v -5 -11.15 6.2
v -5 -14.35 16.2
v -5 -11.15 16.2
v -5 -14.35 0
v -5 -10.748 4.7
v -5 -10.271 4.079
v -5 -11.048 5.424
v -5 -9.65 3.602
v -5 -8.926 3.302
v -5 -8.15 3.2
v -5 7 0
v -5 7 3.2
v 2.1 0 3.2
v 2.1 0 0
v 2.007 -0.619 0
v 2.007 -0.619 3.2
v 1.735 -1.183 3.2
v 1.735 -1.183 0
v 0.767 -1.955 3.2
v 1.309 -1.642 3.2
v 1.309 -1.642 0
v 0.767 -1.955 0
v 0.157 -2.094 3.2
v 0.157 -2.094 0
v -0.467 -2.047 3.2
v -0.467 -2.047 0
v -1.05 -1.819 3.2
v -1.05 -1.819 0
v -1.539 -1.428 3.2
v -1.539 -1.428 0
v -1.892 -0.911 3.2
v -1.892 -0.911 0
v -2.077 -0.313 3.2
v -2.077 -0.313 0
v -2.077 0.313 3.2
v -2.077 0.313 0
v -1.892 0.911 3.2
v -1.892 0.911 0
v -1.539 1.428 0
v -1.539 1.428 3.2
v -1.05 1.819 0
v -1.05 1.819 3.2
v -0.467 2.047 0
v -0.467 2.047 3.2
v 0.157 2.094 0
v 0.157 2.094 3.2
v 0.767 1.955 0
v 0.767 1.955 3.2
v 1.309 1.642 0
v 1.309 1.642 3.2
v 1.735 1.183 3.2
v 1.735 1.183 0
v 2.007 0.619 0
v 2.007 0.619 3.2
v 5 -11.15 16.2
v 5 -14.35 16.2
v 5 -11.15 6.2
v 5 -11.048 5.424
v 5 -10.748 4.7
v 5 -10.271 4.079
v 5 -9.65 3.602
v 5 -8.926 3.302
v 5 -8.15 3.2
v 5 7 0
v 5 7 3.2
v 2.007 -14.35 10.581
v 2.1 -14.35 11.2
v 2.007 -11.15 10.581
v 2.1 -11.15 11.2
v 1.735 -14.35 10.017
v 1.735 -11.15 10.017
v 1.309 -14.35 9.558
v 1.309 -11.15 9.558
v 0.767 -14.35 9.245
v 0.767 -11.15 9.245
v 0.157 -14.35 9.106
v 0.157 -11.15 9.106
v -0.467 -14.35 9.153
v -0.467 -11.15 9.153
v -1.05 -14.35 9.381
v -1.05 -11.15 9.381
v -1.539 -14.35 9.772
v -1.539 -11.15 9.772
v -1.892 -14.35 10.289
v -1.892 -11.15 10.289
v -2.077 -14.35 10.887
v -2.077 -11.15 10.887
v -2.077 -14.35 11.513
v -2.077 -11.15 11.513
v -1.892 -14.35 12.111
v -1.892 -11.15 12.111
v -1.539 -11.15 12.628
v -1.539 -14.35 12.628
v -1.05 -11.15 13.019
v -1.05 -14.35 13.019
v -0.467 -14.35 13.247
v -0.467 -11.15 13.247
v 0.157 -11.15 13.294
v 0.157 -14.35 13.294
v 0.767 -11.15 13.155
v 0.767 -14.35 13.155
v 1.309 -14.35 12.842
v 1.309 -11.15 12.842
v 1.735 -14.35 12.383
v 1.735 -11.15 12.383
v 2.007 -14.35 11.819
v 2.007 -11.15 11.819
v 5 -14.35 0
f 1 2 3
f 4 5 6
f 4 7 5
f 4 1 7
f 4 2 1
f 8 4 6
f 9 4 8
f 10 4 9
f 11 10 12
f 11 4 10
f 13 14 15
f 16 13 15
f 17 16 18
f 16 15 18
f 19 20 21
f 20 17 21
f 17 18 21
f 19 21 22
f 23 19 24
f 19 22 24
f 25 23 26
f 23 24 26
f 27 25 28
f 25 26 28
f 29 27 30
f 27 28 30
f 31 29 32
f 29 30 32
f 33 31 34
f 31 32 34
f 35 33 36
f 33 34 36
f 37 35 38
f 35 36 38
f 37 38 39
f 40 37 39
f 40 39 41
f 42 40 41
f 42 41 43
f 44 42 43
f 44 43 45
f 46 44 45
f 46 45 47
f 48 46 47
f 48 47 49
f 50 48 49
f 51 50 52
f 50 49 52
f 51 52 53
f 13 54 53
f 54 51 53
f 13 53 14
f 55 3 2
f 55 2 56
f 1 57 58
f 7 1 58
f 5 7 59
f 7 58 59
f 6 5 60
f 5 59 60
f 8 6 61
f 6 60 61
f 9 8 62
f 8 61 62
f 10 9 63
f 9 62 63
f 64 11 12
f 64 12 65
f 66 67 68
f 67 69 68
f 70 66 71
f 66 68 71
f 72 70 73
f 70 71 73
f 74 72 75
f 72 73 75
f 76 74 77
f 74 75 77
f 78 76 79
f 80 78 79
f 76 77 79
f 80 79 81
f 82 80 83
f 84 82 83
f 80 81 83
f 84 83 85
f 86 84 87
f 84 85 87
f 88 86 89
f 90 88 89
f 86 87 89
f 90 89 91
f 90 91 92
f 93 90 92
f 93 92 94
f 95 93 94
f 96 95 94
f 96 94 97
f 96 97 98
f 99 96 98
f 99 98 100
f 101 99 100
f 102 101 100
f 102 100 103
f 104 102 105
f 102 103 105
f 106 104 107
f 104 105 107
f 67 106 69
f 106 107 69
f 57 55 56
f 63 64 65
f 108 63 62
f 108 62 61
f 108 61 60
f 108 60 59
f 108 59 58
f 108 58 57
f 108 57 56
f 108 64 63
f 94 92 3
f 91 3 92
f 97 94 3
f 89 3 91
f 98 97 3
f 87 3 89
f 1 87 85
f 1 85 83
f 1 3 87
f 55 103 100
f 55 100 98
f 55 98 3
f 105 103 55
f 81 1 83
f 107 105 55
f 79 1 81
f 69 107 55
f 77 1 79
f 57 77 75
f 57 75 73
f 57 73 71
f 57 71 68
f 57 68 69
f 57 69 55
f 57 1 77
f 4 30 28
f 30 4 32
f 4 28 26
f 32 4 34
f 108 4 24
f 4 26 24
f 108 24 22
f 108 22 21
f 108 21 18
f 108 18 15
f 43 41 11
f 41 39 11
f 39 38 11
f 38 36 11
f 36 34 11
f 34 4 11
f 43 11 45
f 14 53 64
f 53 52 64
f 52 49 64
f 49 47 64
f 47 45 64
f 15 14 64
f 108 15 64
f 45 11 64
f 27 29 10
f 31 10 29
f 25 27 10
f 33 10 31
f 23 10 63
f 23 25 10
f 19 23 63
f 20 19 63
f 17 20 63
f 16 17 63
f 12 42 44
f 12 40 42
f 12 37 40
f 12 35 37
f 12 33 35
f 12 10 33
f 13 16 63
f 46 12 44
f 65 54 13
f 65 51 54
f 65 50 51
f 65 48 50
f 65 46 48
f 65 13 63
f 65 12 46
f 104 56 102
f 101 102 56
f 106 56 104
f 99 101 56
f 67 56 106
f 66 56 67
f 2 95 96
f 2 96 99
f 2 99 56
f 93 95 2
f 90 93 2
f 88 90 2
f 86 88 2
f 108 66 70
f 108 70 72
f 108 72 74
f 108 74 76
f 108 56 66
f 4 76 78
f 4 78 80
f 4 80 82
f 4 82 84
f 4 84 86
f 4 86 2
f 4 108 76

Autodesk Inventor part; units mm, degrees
ref_plane "YZ Plane" through (0, 0, 0) normal (1, 0, 0) x (0, 1, 0)
ref_plane "XZ Plane" through (0, 0, 0) normal (0, 1, 0) x (-1, 0, 0)
ref_plane "XY Plane" through (0, 0, 0) normal (0, 0, 1) x (1, 0, 0)
sketch "Эскиз1" plane through (0, 0, 0) normal (0, 0, 1) x (1, 0, 0)
  circle A0 centre (0, 0) radius 2.1
  line L0 (-5, 14.35) -> (5, 14.35)
  line L1 (5, 14.35) -> (5, -14.35)
  line L2 (5, -14.35) -> (-5, -14.35)
  line L3 (-5, -14.35) -> (-5, 14.35)
  line L4 (-5, 14.35) -> (5, -14.35) construction
  line L5 (5, 14.35) -> (-5, -14.35) construction
  line L6 (-5, 7) -> (5, 7)
  dimension "d0" = 4.2
  dimension "d2" = 10
  dimension "d3" = 28.7
  dimension "d4" = 7
extrude "Выдавливание1" add sketch "Эскиз1" along normal blind 3.2 contours L6 L1 L2 L3
sketch "Эскиз2" plane through (0, 0, 3.2) normal (0, 0, 1) x (1, 0, 0)
  line L0 (5, -14.35) -> (5, 7) projected
  line L1 (5, -14.35) -> (-5, -14.35)
  line L2 (-5, -14.35) -> (-5, -11.15)
  line L3 (-5, -11.15) -> (5, -11.15)
  line L4 (5, -11.15) -> (5, -14.35)
  point P0 (0, 0)
  point P1 (5, -11.15)
  dimension "d7" = 10
  dimension "d8" = 3.2
extrude "Выдавливание2" add sketch "Эскиз2" along normal blind 13
fillet "Сопряжение1" radius 3 1 edges at (0, -11.15, 3.2)
sketch "Эскиз3" plane through (-5, -11.15, 16.2) normal (0, 1, 0) x (1, 0, 0)
  line L0 (0, 10) -> (10, 10) projected
  line L1 (5, 10) -> (5, 0)
  line L2 (0, 0) -> (10, 0) projected
  circle A0 centre (5, 5) radius 2.1
  point P0 (5, 16.2)
  dimension "d12" = 4.2
extrude "Выдавливание3" cut sketch "Эскиз3" against normal blind 13
properties part number "мертвое колесо крепл 25-26"
